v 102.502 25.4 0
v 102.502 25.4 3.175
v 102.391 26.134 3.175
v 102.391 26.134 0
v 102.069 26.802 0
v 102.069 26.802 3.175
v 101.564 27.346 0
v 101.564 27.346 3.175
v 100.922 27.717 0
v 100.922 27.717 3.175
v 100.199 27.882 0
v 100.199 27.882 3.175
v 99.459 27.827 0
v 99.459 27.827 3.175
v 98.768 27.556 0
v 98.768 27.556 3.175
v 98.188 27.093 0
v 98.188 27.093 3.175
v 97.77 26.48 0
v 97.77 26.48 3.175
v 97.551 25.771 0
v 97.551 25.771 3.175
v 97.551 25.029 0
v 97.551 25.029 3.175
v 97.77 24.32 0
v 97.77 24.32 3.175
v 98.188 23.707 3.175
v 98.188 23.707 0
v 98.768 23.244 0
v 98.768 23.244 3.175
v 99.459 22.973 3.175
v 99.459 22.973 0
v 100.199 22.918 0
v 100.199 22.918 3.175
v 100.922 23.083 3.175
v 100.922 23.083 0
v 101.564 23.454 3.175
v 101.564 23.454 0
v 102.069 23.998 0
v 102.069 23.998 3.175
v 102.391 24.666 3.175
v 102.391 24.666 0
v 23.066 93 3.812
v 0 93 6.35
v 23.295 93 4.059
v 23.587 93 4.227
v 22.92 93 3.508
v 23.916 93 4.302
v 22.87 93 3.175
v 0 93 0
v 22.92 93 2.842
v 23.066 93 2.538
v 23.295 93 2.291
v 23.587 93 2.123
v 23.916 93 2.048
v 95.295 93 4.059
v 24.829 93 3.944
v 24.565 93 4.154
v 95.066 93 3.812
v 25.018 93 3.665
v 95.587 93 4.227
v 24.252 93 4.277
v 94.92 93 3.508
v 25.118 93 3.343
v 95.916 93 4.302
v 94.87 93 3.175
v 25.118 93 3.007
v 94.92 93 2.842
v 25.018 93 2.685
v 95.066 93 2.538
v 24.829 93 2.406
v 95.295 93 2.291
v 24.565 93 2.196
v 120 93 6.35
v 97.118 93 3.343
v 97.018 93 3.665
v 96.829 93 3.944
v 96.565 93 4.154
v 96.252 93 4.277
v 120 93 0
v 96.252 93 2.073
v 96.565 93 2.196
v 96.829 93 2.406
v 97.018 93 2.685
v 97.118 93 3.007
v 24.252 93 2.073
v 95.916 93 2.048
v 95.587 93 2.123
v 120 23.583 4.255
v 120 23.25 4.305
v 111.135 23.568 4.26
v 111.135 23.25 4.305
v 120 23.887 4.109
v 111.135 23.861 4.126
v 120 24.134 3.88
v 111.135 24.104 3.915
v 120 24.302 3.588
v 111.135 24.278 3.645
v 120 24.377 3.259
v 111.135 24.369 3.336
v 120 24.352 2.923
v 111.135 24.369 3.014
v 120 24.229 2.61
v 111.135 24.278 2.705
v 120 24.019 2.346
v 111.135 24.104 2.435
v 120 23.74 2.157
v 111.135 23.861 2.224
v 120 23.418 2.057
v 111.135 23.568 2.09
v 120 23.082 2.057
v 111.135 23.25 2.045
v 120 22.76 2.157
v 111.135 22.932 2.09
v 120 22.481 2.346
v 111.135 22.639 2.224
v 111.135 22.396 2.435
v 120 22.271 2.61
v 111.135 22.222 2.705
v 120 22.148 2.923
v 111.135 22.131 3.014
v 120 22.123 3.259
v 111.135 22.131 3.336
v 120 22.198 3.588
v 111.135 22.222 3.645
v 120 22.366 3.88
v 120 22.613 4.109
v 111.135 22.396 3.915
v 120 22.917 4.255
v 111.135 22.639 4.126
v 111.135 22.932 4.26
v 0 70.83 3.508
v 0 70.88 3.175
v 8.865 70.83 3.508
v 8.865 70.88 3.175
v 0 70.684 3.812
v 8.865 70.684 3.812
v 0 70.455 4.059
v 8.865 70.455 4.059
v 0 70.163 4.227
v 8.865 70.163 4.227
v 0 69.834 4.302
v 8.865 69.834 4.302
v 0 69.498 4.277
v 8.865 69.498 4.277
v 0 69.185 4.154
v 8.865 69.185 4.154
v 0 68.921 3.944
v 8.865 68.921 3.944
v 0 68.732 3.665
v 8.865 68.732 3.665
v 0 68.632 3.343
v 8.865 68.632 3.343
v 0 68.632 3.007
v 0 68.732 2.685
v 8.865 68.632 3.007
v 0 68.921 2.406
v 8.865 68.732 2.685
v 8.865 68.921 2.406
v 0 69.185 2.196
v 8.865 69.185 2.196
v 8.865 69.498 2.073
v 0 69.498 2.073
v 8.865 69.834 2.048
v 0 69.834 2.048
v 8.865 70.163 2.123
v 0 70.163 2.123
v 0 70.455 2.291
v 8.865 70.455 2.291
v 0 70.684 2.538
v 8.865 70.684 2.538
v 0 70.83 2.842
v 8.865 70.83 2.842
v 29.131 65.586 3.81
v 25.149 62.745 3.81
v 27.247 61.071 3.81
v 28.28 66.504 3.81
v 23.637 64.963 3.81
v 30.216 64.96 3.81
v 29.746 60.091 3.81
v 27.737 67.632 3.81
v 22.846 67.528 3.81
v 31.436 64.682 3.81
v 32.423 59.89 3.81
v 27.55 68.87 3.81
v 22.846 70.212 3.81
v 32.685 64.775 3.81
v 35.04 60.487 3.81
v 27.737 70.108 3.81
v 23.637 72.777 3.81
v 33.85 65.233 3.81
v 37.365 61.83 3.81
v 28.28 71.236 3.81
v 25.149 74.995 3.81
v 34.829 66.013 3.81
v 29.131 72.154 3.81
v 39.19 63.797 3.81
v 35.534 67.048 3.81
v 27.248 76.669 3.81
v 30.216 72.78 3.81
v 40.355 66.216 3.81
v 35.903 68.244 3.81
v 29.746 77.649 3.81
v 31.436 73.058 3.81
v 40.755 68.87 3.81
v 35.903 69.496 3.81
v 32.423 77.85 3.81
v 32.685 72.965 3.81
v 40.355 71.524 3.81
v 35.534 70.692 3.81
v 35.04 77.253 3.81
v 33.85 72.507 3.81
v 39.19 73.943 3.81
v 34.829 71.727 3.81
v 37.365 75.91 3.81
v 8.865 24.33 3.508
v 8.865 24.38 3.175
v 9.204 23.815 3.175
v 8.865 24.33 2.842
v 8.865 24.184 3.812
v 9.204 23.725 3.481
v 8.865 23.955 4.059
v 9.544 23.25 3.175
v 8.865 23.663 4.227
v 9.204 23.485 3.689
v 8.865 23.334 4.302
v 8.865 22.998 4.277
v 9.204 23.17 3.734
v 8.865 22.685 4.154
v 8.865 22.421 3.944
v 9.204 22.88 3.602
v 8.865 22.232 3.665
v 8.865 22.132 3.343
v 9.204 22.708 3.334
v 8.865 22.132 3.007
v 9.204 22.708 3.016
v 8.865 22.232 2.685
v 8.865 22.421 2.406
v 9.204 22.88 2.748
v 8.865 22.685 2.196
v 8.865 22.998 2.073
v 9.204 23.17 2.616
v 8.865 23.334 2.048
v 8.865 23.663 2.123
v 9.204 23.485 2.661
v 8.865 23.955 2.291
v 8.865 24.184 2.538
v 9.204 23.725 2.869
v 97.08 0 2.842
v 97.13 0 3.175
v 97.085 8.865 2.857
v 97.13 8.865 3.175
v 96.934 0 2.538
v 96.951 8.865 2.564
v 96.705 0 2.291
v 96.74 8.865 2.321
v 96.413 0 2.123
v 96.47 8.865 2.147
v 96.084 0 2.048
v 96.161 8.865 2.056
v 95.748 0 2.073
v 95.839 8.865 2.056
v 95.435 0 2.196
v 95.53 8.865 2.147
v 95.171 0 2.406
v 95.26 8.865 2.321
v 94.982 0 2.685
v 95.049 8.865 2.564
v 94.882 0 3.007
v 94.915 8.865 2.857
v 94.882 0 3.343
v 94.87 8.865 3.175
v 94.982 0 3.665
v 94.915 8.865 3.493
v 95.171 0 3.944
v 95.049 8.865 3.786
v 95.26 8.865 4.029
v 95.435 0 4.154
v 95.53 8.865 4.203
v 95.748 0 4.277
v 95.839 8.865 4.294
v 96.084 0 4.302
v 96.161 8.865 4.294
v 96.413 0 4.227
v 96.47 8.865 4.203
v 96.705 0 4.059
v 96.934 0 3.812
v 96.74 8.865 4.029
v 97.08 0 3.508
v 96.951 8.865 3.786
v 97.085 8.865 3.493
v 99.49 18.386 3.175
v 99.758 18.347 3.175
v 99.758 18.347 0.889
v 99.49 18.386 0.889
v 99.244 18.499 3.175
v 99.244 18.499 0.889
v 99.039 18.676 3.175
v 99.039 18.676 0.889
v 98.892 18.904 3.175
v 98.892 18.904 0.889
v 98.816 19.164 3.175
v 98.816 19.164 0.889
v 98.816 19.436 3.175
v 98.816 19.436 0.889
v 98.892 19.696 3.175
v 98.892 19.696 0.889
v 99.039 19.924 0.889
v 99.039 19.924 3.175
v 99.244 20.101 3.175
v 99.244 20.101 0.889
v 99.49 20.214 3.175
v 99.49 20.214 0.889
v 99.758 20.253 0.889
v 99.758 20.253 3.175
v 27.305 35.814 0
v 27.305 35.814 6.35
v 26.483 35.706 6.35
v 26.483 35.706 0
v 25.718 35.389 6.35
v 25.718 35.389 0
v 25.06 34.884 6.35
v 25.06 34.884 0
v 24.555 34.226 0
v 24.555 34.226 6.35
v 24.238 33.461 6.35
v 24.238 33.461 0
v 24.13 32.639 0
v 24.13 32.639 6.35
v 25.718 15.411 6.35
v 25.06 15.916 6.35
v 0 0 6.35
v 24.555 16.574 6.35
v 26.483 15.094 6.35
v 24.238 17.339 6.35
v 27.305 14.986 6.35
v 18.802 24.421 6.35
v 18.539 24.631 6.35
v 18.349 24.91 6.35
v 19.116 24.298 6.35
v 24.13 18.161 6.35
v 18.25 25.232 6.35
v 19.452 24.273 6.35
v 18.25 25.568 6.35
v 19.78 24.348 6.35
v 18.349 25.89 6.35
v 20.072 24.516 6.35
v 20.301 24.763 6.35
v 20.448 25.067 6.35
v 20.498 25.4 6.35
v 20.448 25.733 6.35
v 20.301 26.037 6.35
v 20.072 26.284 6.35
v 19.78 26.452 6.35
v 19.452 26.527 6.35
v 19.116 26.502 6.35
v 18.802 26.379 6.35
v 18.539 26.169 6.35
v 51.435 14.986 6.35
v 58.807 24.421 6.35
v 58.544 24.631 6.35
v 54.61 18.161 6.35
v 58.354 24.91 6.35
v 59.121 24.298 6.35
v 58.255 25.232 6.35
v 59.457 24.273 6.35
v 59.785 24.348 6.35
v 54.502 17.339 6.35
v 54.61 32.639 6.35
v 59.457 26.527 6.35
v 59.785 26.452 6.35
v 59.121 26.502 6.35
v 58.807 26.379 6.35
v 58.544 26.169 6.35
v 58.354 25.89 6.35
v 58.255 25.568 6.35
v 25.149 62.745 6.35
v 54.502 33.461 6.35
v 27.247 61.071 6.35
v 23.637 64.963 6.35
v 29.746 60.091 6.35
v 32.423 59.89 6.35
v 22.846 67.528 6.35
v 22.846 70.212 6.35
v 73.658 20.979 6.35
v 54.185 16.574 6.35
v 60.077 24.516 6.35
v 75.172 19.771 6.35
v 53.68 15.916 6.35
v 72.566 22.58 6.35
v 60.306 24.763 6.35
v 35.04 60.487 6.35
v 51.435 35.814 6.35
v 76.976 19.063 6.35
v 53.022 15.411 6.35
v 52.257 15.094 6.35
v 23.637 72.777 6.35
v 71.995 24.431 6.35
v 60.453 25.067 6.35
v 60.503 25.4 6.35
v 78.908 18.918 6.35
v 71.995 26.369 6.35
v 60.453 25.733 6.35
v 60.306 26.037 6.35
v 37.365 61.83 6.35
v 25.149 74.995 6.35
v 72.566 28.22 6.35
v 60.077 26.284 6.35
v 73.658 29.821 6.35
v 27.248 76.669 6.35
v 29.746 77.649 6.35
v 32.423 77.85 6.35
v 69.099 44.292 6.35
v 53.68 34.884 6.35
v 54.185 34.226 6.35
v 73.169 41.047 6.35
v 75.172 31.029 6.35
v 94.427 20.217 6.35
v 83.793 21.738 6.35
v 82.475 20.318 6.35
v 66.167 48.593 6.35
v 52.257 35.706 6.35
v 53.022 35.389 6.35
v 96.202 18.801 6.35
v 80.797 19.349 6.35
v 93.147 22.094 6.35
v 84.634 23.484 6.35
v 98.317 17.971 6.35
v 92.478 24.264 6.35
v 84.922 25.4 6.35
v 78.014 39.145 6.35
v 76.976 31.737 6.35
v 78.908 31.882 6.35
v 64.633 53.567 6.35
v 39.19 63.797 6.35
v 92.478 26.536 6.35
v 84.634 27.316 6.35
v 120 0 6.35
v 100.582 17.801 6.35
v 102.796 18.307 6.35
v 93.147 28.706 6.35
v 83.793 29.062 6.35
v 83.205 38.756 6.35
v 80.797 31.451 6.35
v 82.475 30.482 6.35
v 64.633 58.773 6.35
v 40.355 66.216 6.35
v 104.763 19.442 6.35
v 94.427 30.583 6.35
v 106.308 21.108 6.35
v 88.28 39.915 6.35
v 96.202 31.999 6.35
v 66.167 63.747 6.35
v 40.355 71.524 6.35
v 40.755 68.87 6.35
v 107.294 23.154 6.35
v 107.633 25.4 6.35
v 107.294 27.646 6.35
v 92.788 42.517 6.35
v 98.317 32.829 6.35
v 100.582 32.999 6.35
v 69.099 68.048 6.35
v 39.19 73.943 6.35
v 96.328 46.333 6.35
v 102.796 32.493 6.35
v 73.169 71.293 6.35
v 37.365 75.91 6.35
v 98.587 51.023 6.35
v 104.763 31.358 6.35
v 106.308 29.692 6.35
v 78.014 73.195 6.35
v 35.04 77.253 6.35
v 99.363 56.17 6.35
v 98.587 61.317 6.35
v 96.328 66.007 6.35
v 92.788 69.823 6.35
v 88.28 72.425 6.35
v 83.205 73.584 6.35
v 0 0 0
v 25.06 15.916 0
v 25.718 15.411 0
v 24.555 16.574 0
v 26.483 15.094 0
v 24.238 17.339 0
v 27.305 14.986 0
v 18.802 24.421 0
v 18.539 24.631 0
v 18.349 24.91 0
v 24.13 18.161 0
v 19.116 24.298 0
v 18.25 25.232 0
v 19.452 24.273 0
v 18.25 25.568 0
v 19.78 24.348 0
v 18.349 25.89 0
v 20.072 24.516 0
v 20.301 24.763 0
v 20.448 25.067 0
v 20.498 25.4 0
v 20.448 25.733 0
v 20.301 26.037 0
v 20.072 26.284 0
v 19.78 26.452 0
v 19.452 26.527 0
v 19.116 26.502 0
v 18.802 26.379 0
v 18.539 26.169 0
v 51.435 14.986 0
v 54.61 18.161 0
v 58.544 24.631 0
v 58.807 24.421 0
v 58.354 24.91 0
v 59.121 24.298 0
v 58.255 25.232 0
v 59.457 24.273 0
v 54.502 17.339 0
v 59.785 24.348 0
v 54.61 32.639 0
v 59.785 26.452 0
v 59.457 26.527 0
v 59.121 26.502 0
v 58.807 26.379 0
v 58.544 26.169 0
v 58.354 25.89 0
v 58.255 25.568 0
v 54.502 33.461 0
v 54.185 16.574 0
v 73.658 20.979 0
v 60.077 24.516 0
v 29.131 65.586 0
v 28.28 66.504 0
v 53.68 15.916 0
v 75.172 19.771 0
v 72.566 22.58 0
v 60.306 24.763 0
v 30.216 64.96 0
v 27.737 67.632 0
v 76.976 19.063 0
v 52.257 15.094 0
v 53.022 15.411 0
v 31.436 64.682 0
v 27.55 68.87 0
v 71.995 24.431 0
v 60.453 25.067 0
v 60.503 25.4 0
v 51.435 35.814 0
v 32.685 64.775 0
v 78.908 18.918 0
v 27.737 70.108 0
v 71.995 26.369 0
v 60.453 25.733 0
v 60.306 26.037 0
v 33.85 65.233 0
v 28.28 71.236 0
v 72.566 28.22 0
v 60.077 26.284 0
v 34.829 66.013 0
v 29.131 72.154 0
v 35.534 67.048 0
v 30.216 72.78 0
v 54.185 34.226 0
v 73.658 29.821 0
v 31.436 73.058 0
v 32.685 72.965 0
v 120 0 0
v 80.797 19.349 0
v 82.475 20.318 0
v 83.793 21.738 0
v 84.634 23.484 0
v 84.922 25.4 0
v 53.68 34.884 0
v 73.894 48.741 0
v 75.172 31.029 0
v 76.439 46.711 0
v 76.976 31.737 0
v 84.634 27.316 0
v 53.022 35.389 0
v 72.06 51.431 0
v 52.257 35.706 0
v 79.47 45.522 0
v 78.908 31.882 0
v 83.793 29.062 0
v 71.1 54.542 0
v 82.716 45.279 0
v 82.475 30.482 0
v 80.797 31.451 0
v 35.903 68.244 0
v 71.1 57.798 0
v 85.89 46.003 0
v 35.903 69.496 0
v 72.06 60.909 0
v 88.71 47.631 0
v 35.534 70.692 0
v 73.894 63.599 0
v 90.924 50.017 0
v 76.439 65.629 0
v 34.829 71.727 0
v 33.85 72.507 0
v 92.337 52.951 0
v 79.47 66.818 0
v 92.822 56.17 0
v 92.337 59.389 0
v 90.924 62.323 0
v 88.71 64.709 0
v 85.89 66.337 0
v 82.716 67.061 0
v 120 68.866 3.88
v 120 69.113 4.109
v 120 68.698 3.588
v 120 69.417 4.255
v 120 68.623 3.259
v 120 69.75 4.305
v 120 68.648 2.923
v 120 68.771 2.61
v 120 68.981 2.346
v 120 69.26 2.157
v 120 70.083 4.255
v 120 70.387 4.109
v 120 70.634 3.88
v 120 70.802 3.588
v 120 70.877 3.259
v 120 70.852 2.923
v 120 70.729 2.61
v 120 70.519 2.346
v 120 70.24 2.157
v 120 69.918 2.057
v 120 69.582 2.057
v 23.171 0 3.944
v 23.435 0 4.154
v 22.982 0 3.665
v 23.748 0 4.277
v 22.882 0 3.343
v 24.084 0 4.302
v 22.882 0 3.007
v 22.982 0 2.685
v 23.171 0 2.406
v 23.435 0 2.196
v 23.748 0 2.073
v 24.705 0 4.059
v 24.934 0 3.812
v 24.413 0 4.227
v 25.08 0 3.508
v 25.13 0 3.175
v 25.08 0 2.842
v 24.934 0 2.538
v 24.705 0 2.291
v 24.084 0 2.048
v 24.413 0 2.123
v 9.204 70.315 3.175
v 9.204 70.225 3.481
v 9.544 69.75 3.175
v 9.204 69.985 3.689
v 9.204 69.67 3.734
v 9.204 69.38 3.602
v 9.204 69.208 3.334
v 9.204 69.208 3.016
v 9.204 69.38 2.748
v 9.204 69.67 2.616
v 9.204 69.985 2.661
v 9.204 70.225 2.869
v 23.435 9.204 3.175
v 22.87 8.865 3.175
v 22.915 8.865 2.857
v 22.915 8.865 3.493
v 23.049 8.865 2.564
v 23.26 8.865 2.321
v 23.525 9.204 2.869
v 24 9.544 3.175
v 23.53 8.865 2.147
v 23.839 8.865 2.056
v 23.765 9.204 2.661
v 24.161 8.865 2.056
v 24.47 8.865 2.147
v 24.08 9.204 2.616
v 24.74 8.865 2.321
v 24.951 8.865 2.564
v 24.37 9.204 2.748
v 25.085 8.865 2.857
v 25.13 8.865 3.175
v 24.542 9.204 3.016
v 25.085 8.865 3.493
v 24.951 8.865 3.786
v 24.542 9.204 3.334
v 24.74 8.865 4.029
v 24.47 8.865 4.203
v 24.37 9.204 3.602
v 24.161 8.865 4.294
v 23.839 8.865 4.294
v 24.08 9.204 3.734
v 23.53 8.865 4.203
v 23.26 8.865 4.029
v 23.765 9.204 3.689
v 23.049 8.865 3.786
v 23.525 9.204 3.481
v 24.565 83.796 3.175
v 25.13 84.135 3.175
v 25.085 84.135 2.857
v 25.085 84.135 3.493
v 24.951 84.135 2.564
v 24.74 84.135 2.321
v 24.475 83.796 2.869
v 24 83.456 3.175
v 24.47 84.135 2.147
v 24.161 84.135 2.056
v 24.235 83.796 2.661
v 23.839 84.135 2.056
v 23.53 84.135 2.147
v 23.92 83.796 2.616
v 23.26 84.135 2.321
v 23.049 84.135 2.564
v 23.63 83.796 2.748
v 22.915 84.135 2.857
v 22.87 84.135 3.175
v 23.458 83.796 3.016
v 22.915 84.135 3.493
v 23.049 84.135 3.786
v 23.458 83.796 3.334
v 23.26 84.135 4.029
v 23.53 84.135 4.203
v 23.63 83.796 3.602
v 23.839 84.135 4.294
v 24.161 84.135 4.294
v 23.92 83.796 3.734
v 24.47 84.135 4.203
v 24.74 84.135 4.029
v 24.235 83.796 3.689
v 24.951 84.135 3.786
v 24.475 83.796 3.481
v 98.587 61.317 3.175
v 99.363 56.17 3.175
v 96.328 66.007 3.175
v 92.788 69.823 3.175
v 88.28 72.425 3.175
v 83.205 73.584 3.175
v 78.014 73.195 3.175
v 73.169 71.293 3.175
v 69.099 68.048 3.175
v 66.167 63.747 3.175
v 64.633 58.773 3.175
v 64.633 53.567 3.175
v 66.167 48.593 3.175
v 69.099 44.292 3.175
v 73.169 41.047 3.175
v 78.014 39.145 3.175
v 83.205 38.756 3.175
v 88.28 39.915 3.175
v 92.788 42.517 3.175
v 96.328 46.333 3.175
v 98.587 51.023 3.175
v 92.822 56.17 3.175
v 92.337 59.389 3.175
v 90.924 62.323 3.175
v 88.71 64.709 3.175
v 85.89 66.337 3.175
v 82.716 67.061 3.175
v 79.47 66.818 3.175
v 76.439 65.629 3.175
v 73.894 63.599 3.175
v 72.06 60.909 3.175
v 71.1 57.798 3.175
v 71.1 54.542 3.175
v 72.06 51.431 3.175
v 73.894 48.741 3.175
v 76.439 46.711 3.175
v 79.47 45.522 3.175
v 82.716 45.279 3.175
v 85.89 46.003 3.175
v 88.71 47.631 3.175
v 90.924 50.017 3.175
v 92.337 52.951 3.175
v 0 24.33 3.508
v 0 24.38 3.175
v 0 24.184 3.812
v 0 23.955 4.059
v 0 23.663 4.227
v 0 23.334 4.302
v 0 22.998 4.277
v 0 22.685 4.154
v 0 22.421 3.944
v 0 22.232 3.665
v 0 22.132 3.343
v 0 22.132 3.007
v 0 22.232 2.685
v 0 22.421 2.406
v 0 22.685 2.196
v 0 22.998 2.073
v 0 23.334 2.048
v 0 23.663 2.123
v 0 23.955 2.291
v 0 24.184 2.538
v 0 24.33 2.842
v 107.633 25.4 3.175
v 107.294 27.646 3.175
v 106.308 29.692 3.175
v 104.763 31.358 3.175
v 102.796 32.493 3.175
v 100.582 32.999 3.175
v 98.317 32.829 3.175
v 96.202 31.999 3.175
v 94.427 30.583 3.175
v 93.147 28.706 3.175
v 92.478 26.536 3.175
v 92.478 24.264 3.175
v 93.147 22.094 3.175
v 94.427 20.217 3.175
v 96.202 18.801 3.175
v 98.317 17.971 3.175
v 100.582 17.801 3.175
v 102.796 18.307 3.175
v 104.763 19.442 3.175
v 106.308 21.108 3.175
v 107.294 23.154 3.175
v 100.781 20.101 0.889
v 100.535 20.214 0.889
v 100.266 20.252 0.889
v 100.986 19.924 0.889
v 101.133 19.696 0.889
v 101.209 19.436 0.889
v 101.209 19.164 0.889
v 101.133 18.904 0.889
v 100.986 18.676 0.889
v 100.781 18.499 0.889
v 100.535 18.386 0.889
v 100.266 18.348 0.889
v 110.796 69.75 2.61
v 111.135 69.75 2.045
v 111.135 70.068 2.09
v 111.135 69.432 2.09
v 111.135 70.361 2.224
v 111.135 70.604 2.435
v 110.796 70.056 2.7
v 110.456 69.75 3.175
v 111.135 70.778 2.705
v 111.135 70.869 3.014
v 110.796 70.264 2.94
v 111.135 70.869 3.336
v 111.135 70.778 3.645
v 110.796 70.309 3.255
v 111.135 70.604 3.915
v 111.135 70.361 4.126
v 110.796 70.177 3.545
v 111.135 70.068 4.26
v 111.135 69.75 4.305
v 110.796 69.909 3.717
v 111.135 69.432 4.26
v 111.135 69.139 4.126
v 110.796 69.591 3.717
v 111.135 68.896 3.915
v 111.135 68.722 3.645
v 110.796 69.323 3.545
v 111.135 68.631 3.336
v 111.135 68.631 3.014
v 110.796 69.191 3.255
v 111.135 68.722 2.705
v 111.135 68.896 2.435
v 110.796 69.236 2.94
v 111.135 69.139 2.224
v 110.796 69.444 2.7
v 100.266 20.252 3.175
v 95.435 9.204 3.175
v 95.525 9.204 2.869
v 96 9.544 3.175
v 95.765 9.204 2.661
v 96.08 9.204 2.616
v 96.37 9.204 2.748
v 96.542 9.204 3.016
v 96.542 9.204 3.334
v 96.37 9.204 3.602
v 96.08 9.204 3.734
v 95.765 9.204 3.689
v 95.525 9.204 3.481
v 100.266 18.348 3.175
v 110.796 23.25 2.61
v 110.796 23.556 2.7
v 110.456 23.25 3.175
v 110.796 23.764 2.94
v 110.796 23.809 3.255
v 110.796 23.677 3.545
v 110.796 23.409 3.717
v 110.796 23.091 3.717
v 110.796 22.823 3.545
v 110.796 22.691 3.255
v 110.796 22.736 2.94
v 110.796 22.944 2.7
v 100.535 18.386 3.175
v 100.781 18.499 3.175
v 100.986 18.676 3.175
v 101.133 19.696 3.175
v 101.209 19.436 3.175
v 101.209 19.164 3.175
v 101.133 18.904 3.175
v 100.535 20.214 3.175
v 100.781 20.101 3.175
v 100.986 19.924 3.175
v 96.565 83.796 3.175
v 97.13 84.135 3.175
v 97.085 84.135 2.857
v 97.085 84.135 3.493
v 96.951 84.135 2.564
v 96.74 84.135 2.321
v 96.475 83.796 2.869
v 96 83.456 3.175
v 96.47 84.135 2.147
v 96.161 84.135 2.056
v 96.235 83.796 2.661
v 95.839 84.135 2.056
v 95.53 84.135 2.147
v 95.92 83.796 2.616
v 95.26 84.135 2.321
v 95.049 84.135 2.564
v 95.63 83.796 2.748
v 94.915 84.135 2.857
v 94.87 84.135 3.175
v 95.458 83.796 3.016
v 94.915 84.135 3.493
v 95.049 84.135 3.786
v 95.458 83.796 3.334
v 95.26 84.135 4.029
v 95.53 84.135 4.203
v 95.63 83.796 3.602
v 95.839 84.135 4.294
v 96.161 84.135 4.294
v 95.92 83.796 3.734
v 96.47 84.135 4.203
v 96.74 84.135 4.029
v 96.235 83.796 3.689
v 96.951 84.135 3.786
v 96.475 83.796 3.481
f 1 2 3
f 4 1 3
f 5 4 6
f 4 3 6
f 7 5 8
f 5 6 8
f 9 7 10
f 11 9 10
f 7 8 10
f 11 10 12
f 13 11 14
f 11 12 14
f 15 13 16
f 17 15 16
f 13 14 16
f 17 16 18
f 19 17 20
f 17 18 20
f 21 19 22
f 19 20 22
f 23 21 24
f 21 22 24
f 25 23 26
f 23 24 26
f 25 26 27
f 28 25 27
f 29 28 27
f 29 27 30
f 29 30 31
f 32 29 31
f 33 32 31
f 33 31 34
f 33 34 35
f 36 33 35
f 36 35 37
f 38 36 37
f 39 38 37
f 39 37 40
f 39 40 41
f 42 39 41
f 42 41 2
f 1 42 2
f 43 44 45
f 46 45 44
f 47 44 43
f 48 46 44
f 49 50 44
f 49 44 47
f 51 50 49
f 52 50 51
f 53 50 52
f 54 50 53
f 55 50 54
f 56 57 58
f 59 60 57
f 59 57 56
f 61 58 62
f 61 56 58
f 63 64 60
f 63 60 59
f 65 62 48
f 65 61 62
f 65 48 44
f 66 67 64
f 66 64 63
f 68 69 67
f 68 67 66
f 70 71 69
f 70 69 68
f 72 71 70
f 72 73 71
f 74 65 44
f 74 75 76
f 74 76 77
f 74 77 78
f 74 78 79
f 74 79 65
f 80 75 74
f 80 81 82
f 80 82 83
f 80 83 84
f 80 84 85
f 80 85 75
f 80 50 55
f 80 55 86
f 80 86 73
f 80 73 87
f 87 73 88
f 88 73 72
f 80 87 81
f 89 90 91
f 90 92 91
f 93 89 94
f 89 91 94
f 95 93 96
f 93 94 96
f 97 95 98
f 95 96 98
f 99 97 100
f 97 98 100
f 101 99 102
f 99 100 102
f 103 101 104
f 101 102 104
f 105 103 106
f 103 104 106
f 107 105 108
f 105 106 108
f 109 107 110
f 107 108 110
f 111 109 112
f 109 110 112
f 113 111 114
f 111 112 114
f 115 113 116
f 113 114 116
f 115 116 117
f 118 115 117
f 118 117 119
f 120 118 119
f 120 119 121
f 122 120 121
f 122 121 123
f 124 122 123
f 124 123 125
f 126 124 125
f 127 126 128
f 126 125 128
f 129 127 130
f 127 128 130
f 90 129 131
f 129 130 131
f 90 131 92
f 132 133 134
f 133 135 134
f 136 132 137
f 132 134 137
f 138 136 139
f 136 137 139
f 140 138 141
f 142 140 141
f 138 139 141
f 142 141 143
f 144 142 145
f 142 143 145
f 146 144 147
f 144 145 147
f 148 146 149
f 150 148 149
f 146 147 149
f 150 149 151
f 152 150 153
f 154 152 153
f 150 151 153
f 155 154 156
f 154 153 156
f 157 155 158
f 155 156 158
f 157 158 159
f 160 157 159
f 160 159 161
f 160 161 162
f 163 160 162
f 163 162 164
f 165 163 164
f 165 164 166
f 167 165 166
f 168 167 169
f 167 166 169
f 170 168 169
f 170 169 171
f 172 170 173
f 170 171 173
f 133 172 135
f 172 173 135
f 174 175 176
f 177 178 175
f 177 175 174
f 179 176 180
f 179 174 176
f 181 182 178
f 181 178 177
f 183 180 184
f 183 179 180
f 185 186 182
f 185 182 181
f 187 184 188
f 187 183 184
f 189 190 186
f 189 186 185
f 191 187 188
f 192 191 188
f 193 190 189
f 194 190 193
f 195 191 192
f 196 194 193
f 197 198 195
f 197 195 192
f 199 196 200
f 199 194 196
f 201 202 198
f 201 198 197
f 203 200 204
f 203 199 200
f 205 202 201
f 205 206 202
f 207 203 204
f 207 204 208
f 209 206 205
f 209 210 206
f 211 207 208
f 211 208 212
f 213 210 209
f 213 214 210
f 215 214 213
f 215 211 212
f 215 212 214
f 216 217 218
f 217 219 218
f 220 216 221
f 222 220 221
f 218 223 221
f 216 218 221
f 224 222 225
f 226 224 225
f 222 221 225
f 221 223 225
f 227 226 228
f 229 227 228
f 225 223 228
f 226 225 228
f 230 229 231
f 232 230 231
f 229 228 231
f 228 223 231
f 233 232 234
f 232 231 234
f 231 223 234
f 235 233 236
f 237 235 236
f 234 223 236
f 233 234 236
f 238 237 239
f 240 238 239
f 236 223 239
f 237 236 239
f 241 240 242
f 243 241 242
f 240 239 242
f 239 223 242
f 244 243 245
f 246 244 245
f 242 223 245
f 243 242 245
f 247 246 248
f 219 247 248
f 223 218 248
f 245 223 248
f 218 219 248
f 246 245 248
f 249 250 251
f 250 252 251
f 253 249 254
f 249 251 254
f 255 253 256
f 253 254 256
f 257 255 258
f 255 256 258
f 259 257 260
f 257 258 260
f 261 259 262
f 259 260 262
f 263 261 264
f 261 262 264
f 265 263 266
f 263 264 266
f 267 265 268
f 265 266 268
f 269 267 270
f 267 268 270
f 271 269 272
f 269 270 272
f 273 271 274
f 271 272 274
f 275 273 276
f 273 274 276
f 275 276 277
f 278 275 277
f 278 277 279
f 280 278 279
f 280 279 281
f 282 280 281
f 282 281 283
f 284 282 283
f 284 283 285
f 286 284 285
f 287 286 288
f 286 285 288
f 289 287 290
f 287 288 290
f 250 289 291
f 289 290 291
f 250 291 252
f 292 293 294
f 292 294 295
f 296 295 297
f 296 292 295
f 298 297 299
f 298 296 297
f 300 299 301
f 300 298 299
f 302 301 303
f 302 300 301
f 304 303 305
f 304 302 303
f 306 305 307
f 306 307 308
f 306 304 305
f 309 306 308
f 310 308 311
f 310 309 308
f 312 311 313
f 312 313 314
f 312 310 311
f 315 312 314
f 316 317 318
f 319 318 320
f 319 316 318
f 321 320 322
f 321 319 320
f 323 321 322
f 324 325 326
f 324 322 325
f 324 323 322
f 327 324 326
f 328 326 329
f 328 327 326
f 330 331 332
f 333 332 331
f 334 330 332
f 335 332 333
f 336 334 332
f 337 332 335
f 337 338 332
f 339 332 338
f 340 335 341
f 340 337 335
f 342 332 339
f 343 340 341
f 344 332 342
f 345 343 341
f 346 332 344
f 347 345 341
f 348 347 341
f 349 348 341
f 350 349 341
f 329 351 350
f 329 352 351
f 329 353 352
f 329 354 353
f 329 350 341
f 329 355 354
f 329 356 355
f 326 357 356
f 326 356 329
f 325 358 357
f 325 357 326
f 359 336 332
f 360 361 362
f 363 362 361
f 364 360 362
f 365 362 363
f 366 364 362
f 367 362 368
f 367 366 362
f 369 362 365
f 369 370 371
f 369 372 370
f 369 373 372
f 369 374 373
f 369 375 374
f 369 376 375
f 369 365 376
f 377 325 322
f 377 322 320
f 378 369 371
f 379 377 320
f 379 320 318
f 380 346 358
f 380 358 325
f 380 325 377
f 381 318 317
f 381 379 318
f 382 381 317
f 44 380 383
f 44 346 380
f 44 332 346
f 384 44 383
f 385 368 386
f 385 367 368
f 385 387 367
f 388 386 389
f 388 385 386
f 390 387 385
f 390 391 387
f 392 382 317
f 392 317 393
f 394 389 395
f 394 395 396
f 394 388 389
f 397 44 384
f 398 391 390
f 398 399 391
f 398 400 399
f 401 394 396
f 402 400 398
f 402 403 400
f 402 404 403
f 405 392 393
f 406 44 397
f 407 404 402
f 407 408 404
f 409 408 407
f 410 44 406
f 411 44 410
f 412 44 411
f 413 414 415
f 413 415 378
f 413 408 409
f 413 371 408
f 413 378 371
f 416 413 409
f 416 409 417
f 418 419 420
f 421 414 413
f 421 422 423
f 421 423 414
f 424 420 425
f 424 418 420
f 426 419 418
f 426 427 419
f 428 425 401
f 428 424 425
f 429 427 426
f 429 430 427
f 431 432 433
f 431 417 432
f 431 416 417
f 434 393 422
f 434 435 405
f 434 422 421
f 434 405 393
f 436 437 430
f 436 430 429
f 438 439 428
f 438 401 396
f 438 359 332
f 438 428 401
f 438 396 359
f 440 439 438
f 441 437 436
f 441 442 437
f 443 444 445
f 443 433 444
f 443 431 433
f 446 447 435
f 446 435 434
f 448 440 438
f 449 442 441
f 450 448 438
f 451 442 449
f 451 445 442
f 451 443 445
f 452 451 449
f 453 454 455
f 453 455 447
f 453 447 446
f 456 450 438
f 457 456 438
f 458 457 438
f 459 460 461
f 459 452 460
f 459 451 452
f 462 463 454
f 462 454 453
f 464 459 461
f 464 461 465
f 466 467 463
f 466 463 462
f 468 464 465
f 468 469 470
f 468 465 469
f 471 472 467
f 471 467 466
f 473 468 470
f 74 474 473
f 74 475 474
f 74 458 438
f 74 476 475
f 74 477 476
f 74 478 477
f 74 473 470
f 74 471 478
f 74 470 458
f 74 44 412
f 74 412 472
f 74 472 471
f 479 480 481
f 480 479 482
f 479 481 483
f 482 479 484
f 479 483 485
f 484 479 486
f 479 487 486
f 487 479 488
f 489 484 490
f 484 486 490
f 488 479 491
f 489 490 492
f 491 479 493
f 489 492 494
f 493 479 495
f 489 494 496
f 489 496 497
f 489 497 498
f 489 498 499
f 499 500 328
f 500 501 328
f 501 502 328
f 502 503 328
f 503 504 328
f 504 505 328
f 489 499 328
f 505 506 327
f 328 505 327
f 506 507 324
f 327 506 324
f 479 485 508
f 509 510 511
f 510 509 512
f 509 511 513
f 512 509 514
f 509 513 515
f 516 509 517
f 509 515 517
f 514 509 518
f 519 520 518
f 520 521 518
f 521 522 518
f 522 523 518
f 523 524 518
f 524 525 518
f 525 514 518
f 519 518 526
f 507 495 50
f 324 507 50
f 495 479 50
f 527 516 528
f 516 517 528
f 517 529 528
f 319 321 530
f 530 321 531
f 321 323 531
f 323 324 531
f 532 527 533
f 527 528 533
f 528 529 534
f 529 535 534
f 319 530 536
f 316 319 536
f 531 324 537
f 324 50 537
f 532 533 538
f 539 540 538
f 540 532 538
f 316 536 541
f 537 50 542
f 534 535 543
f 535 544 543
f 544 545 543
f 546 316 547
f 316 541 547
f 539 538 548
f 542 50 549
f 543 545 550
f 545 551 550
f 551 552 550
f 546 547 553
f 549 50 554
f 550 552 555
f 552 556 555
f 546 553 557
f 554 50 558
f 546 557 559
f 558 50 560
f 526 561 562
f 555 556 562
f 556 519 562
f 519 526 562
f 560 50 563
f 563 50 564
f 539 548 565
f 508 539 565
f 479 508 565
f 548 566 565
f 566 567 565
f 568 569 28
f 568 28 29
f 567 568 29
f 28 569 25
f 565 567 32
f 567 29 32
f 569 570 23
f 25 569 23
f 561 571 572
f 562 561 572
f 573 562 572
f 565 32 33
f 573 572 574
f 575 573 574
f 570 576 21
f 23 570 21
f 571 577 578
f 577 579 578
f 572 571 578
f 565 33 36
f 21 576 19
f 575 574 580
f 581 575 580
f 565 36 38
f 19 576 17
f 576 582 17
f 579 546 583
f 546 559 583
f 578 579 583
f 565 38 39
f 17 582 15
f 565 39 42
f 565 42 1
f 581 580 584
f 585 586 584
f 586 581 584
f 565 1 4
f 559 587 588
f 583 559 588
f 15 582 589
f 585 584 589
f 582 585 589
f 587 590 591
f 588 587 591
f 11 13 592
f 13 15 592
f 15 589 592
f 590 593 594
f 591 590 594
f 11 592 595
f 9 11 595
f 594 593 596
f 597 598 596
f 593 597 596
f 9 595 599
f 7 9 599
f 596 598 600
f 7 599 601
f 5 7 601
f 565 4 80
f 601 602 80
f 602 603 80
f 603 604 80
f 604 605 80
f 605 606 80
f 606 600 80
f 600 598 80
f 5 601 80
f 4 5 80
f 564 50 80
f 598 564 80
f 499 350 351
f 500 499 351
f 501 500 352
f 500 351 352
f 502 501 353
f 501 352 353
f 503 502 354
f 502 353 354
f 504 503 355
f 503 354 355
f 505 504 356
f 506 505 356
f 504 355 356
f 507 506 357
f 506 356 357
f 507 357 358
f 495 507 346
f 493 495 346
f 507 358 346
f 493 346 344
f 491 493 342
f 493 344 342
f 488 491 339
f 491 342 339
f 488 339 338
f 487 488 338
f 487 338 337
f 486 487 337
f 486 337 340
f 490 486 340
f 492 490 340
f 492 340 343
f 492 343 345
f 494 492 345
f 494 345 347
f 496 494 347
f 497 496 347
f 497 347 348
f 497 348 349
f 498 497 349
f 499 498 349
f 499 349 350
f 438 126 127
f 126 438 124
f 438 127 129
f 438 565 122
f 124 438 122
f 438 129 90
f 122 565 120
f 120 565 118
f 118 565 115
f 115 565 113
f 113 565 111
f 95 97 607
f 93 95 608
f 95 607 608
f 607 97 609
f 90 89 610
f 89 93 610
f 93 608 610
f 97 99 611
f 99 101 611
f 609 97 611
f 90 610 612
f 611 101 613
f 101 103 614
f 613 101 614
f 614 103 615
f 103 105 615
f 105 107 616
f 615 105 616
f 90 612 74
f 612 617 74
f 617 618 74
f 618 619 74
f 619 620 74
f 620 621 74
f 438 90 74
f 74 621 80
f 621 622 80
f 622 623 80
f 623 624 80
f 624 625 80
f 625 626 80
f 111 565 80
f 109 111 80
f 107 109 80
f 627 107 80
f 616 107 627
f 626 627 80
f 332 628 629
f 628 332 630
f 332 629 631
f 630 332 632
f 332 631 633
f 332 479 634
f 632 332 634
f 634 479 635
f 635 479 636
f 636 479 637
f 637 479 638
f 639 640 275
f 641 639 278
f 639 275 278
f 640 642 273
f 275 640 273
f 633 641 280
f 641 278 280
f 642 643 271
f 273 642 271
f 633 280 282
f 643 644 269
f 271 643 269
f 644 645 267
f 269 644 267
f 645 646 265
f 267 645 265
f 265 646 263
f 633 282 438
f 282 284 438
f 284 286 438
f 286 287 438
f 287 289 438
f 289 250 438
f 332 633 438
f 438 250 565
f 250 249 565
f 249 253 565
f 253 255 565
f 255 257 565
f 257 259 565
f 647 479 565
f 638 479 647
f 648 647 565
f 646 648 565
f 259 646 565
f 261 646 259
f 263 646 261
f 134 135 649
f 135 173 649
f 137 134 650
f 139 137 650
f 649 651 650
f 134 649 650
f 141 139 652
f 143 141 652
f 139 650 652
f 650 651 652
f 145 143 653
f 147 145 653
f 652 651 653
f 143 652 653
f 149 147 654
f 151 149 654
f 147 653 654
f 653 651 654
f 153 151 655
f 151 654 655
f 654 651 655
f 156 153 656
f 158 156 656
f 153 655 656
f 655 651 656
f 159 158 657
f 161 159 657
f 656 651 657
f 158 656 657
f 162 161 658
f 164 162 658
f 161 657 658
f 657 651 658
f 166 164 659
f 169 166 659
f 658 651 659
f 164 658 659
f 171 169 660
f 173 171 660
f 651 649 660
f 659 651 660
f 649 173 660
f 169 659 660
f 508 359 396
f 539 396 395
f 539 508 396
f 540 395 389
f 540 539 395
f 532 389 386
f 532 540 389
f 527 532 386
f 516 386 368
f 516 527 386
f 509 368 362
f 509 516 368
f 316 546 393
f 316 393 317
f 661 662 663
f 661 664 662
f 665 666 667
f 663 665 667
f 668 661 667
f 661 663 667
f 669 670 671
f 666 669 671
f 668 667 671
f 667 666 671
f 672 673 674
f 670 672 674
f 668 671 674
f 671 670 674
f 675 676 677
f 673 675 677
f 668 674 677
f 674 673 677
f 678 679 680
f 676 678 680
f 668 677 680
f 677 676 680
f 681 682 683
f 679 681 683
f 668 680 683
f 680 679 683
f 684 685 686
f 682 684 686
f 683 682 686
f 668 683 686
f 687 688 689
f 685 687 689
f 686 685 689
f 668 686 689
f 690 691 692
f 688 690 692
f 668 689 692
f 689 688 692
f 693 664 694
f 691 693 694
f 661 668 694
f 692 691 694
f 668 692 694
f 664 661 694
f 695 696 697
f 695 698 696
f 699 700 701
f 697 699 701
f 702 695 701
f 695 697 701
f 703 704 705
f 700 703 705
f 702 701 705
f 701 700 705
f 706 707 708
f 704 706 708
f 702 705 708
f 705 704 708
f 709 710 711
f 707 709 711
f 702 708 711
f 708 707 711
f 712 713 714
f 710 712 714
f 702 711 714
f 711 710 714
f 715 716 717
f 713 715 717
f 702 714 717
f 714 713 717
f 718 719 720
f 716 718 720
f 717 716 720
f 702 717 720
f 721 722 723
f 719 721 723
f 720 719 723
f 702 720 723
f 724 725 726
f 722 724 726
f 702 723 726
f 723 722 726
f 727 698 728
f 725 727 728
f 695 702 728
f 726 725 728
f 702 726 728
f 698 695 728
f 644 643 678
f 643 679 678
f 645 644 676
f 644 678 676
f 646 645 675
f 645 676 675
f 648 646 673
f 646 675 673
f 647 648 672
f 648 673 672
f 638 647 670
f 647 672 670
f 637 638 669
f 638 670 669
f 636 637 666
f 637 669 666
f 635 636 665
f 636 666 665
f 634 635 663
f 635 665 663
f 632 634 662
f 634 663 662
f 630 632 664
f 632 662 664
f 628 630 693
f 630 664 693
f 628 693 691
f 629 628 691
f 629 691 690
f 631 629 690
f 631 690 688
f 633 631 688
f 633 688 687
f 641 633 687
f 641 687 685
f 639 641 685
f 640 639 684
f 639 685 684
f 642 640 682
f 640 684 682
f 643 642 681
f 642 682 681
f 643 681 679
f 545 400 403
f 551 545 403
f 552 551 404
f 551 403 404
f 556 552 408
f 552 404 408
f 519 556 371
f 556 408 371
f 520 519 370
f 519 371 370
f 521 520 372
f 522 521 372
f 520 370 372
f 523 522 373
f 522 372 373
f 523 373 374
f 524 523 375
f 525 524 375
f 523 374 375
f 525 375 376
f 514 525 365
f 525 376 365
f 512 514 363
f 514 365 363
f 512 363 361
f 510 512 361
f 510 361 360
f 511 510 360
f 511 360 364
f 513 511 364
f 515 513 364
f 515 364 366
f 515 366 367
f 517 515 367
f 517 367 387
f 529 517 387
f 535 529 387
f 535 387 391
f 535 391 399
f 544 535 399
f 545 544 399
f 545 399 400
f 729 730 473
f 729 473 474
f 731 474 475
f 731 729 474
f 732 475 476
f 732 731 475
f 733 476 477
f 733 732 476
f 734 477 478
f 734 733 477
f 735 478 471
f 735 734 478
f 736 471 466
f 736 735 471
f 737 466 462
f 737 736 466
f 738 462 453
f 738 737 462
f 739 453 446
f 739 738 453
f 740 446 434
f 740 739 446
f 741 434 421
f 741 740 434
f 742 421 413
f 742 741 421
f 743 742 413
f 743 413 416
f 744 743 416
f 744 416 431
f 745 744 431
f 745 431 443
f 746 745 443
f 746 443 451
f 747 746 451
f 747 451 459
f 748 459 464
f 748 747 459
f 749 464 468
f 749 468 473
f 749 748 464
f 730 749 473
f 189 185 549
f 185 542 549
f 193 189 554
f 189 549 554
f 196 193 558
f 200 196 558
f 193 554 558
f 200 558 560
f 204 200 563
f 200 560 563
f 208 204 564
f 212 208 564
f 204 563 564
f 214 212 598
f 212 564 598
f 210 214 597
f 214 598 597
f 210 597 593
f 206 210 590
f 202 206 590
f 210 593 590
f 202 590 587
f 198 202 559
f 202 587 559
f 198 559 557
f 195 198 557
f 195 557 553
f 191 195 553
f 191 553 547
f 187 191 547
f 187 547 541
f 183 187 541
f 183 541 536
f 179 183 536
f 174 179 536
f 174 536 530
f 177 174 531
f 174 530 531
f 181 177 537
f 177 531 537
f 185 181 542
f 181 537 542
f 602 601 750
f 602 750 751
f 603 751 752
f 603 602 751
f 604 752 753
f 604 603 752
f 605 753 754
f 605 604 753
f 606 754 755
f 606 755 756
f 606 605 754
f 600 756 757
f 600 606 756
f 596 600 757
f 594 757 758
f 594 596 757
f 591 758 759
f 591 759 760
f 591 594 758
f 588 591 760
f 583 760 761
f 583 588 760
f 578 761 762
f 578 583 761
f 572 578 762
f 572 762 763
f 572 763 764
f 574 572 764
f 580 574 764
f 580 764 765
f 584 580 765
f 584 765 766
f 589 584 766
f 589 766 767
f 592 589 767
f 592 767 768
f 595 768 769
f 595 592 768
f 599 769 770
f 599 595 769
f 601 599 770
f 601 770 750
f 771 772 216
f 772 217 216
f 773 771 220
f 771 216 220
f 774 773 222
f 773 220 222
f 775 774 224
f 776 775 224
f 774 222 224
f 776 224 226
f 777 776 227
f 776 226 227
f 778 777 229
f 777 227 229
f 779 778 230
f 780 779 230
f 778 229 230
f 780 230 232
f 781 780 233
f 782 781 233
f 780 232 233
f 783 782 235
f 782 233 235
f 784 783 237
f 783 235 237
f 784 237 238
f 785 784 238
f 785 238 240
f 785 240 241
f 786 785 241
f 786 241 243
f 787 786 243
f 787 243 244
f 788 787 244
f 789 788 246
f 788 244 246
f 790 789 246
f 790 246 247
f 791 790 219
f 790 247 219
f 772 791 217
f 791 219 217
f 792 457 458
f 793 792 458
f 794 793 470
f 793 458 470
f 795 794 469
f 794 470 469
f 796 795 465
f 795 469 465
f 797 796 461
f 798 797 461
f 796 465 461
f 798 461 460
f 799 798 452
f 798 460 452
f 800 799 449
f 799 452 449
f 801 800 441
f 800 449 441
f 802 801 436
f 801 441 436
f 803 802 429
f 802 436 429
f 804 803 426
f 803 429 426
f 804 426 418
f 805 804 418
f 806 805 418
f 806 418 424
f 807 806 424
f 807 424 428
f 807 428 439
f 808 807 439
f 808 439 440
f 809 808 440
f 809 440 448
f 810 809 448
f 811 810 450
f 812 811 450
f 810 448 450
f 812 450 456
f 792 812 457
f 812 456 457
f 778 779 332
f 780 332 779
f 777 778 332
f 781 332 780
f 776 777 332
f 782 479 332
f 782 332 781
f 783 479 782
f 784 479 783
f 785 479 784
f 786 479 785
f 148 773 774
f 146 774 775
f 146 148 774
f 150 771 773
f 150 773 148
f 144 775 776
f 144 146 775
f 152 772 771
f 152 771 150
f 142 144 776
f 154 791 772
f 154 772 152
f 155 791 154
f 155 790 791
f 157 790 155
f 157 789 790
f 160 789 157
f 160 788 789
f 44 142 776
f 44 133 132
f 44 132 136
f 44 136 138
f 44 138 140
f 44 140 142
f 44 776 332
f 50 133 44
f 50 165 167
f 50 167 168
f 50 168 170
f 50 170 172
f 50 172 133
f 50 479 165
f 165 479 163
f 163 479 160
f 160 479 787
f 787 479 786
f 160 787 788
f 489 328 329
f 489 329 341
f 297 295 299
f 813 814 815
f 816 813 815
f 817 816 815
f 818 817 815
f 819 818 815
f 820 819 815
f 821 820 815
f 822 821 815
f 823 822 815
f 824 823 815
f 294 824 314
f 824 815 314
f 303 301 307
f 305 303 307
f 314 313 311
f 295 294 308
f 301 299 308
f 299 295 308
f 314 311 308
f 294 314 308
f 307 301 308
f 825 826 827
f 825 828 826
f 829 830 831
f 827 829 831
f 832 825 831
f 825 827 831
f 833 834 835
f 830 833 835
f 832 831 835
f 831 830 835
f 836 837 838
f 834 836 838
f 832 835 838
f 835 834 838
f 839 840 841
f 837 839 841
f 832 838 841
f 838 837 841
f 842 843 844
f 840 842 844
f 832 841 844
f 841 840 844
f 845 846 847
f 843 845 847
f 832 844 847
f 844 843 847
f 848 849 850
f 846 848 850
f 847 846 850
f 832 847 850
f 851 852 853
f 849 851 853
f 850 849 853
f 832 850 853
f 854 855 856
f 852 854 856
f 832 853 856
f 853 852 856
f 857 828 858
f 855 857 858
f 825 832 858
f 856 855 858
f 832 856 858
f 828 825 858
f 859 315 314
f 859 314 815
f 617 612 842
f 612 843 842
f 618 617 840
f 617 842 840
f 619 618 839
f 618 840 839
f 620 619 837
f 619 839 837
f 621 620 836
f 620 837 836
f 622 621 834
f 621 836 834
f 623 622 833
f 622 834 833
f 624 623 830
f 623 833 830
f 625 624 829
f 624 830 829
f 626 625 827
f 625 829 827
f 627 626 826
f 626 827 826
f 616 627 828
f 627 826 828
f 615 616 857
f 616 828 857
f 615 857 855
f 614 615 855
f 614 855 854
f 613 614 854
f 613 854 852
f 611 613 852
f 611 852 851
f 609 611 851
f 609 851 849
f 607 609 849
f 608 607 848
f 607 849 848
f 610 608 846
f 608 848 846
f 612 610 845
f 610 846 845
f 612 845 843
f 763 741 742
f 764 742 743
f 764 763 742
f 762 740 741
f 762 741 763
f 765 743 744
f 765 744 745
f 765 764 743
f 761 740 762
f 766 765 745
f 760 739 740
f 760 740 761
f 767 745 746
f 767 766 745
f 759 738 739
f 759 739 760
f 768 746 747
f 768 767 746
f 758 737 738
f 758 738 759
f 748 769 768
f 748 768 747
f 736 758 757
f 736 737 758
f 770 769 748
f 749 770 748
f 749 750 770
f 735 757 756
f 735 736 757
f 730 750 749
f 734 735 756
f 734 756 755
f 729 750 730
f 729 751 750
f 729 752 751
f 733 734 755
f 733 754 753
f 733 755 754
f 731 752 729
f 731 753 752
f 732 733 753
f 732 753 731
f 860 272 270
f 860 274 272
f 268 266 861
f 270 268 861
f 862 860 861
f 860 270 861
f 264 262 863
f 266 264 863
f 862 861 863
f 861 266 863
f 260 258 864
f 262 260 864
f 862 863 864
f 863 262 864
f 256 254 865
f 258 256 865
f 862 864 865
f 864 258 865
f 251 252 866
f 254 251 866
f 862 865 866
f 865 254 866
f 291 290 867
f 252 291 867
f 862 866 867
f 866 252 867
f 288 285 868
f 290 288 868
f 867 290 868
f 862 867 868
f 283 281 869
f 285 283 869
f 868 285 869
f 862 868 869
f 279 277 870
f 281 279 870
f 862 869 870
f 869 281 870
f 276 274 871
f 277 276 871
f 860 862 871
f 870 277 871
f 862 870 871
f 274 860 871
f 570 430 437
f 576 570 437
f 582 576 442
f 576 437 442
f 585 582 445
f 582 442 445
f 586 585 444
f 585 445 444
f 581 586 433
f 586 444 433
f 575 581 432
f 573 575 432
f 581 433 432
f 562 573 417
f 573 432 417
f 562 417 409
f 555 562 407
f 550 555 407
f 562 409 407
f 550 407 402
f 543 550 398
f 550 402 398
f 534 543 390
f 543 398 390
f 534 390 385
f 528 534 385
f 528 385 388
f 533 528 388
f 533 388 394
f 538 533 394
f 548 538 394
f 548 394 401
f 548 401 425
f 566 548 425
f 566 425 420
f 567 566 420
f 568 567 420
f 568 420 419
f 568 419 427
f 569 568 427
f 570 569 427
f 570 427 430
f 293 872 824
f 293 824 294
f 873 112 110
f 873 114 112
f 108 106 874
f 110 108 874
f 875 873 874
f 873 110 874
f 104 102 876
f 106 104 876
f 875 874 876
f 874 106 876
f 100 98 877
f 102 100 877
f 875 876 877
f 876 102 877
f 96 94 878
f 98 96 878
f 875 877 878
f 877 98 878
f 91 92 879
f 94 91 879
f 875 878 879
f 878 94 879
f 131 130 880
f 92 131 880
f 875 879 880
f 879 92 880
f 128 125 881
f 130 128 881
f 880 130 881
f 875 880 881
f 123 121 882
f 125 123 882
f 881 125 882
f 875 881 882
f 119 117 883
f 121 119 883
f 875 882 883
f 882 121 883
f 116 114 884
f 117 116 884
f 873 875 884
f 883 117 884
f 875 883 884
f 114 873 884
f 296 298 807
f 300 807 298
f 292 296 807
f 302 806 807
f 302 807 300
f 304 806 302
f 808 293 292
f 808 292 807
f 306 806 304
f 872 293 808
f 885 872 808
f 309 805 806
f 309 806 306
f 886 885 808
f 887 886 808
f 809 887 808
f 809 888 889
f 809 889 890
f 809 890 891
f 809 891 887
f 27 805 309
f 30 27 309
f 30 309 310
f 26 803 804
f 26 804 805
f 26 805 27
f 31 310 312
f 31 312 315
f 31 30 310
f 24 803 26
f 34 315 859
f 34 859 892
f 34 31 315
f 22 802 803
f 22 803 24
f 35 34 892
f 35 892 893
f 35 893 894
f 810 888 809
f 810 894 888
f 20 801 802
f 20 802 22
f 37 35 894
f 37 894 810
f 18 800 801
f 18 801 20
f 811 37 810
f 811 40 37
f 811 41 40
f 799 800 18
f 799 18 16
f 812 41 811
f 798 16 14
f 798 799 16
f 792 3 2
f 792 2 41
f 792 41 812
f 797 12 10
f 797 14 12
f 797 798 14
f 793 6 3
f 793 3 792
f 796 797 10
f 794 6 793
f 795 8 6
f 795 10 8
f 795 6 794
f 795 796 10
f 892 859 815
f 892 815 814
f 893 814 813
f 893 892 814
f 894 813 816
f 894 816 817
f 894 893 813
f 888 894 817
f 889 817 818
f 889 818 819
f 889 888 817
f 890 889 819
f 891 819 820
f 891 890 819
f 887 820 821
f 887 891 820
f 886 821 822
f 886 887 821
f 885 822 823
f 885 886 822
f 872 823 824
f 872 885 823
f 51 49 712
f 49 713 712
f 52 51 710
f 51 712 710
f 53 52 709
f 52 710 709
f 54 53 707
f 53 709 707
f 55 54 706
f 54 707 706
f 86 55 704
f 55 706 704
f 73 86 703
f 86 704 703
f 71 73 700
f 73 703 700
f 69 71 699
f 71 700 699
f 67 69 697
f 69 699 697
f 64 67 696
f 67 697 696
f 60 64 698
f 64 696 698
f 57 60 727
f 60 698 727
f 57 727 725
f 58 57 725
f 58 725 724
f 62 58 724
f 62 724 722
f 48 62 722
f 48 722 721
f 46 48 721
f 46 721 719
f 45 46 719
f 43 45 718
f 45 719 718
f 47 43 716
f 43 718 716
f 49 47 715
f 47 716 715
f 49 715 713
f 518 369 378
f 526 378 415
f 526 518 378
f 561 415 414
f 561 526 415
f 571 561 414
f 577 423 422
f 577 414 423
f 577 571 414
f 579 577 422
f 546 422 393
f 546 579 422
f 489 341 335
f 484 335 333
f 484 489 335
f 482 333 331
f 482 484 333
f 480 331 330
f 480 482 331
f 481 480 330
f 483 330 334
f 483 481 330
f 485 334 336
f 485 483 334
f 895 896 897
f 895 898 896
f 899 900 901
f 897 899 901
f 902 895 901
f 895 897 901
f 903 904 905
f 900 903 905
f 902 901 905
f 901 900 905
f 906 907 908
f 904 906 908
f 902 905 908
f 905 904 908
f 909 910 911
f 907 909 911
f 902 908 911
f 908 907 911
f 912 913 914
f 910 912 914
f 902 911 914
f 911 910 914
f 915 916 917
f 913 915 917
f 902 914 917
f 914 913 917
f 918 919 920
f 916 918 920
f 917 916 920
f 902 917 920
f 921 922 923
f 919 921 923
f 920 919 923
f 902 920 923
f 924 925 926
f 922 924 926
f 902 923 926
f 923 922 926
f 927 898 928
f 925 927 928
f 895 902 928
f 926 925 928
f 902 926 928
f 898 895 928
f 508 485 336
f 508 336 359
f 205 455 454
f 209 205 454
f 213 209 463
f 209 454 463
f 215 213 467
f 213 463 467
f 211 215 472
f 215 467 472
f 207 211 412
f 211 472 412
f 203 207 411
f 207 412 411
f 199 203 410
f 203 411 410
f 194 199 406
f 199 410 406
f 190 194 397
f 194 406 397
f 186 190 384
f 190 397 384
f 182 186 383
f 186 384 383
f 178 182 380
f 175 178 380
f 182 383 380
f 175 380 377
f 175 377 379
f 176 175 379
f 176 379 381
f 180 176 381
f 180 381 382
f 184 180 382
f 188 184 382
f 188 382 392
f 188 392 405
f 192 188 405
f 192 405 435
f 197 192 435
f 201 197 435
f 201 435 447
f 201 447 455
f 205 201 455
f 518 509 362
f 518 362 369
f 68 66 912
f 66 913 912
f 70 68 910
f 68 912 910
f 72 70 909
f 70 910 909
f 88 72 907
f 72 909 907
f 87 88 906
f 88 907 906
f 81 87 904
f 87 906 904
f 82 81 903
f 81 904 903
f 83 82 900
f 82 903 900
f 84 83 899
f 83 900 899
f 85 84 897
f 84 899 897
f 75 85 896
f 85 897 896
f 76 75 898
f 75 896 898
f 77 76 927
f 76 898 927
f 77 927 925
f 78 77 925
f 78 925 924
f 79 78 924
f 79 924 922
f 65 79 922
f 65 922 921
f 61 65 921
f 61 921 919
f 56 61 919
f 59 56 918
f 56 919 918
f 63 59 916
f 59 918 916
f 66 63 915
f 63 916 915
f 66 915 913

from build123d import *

# Parameters (mm, degrees)
SKETCH1_W                               = 120.00000003
SKETCH1_H                               = 92.999999928
BOSS_EXTRUDE1_DEPTH                     = 6.35
AC_INLET_DEPTH                          = 152.951711059
AC_INLET_SCREWS_D                       = 2.2606
FUSEHOLDER_D                            = 13
POWER_SWITCH_R                          = 7.62
POWER_SWITCH_INLAY_DEPTH                = 3.175
POWER_SWITCH_3_R                        = 2.4892
POWER_SWITCH_HOLE_DEPTH                 = 152.951711059
POWER_START                             = -3.175
POWER_SWITCH_LOCK_TAB_DEPTH             = 2.286
LED_PANEL_MOUNT_D                       = 8.0264
ADVANCEDHOLE1_START                     = 3.175
ADVANCEDHOLE1_OUTLINE_R                 = 17.4625
ADVANCEDHOLE1_DEPTH                     = 3.175
ADVANCEDHOLE1_2_OUTLINE_R               = 10.922
ADVANCEDHOLE1_2_DEPTH                   = 3.175
CBORE_FOR_M8_HEX_HEAD_BOLT2_D           = 8.4
CBORE_FOR_M8_HEX_HEAD_BOLT2_CBORE_D     = 18.01
CBORE_FOR_M8_HEX_HEAD_BOLT2_CBORE_DEPTH = 2.54
F_4_40_TAPPED_HOLE1_D                   = 2.2606
F_4_40_TAPPED_HOLE1_DEPTH               = 8.8646
F_4_40_TAPPED_HOLE1_TIP                 = 0.679152758
F_4_40_TAPPED_HOLE2_D                   = 2.2606
F_4_40_TAPPED_HOLE2_DEPTH               = 8.8646
F_4_40_TAPPED_HOLE2_TIP                 = 0.679152758
F_4_40_TAPPED_HOLE4_D                   = 2.2606
F_4_40_TAPPED_HOLE4_DEPTH               = 8.8646
F_4_40_TAPPED_HOLE4_TIP                 = 0.679152758


# Read off the part's stored shape, not the designer's step: AdvancedHole1, #4-40 Tapped Hole3
with BuildPart() as part:
    # Sketch1 → Boss-Extrude1 (new body)
    with BuildSketch(Plane.XY):
        with Locations((60.000000015, 46.499999964)):
            Rectangle(SKETCH1_W, SKETCH1_H)
    extrude(amount=BOSS_EXTRUDE1_DEPTH)

    # Sketch6 → AC Inlet (cut, through all)
    with BuildSketch(Plane(origin=(0, 0, 0), x_dir=(-1, 0, 0), z_dir=(0, 0, -1))):
        with BuildLine():
            Line((-51.435, 35.814), (-27.305, 35.814))
            ThreePointArc((-27.305, 35.814), (-25.05993597, 34.88406403), (-24.13, 32.639))
            Line((-24.13, 32.639), (-24.13, 18.161))
            ThreePointArc((-24.13, 18.161), (-25.05993597, 15.91593597), (-27.305, 14.986))
            Line((-27.305, 14.986), (-51.435, 14.986))
            ThreePointArc((-51.435, 14.986), (-53.68006403, 15.91593597), (-54.61, 18.161))
            Line((-54.61, 18.161), (-54.61, 32.639))
            ThreePointArc((-54.61, 32.639), (-53.68006403, 34.88406403), (-51.435, 35.814))
        make_face()
    extrude(amount=-AC_INLET_DEPTH, mode=Mode.SUBTRACT)

    # AC Inlet Screws (through all)
    with Locations(Plane(origin=(0, 0, 0), x_dir=(-1, 0, 0), z_dir=(0, 0, -1))):
        with Locations((-59.3725, 25.4), (-19.3675, 25.4)):
            Hole(AC_INLET_SCREWS_D / 2)

    # Fuseholder (through all)
    with Locations(Plane(origin=(0, 0, 0), x_dir=(-1, 0, 0), z_dir=(0, 0, -1))):
        with Locations((-78.4225, 25.4)):
            Hole(FUSEHOLDER_D / 2)

    # Power Switch → Power Switch Inlay (cut)
    with BuildSketch(Plane.XY.offset(6.35)):
        with Locations((100.0125, 25.4)):
            Circle(POWER_SWITCH_R)
    extrude(amount=-POWER_SWITCH_INLAY_DEPTH, mode=Mode.SUBTRACT)

    # Power Switch<3> → Power Switch Hole (cut, through all)
    with BuildSketch(Plane.XY.offset(6.35)):
        with Locations((100.0125, 25.4)):
            Circle(POWER_SWITCH_3_R)
    extrude(amount=-POWER_SWITCH_HOLE_DEPTH, mode=Mode.SUBTRACT)

    # Power Switch<4> → Power Switch Lock Tab (cut)
    with BuildSketch(Plane.XY.offset(6.35).offset(POWER_START)):
        with BuildLine():
            Line((99.7585, 20.2525), (100.2665, 20.2525))
            ThreePointArc((100.2665, 20.2525), (101.219, 19.3), (100.2665, 18.3475))
            Line((100.2665, 18.3475), (99.7585, 18.3475))
            ThreePointArc((99.7585, 18.3475), (98.806, 19.3), (99.7585, 20.2525))
        make_face()
    extrude(amount=-POWER_SWITCH_LOCK_TAB_DEPTH, mode=Mode.SUBTRACT)

    # LED Panel Mount (through all)
    with Locations(Plane(origin=(0, 0, 0), x_dir=(-1, 0, 0), z_dir=(0, 0, -1))):
        with Locations((-31.75, 68.869999928)):
            Hole(LED_PANEL_MOUNT_D / 2)

    # AdvancedHole1 outline → AdvancedHole1 (cut)
    with BuildSketch(Plane.XY.offset(ADVANCEDHOLE1_START)):
        with Locations((81.90000003, 56.169999928)):
            Circle(ADVANCEDHOLE1_OUTLINE_R)
    extrude(amount=ADVANCEDHOLE1_DEPTH, mode=Mode.SUBTRACT)

    # AdvancedHole1 2 outline → AdvancedHole1 2 (cut)
    with BuildSketch(Plane.XY):
        with Locations((81.90000003, 56.169999928)):
            Circle(ADVANCEDHOLE1_2_OUTLINE_R)
    extrude(amount=ADVANCEDHOLE1_2_DEPTH, mode=Mode.SUBTRACT)

    # CBORE for M8 Hex Head Bolt2 (through all)
    with Locations(Plane.XY.offset(6.35)):
        with Locations((31.75, 68.869999928)):
            CounterBoreHole(CBORE_FOR_M8_HEX_HEAD_BOLT2_D / 2, CBORE_FOR_M8_HEX_HEAD_BOLT2_CBORE_D / 2, CBORE_FOR_M8_HEX_HEAD_BOLT2_CBORE_DEPTH)

    # #4-40 Tapped Hole1
    with Locations(Plane(origin=(0, 0, 0), x_dir=(-1, 0, 0), z_dir=(0, -1, 0))):
        with Locations((-24.000000006, -3.175), (-96.000000024, -3.175)):
            Hole(F_4_40_TAPPED_HOLE1_D / 2, depth=F_4_40_TAPPED_HOLE1_DEPTH)
            with Locations((0, 0, -(F_4_40_TAPPED_HOLE1_DEPTH + F_4_40_TAPPED_HOLE1_TIP / 2))):  # 118° drill point
                Cone(0, F_4_40_TAPPED_HOLE1_D / 2, F_4_40_TAPPED_HOLE1_TIP, mode=Mode.SUBTRACT)

    # #4-40 Tapped Hole2
    with Locations(Plane(origin=(0, 92.999999928, 0), x_dir=(1, 0, 0), z_dir=(0, 1, 0))):
        with Locations((24.000000006, -3.175), (96.000000024, -3.175)):
            Hole(F_4_40_TAPPED_HOLE2_D / 2, depth=F_4_40_TAPPED_HOLE2_DEPTH)
            with Locations((0, 0, -(F_4_40_TAPPED_HOLE2_DEPTH + F_4_40_TAPPED_HOLE2_TIP / 2))):  # 118° drill point
                Cone(0, F_4_40_TAPPED_HOLE2_D / 2, F_4_40_TAPPED_HOLE2_TIP, mode=Mode.SUBTRACT)

    # #4-40 Tapped Hole3 outline → #4-40 Tapped Hole3 (revolve, cut)
    with BuildSketch(Plane(origin=(0, 23.249999982, 3.175), x_dir=(0, 1, 0), z_dir=(0, 0, -1))):
        Polygon((1.1303, 8.8646), (0, 9.543752758), (0, 0), (1.1303, 0), align=None)
    revolve(axis=Axis((0, 23.249999982, 3.175), (1, 0, 0)), mode=Mode.SUBTRACT)

    # 4-40 Tapped Hole3 2 outline → 4-40 Tapped Hole3 2 (revolve, cut)
    with BuildSketch(Plane(origin=(0, 69.749999946, 3.175), x_dir=(0, 1, 0), z_dir=(0, 0, -1))):
        Polygon((1.1303, 8.8646), (0, 9.543752758), (0, 0), (1.1303, 0), align=None)
    revolve(axis=Axis((0, 69.749999946, 3.175), (1, 0, 0)), mode=Mode.SUBTRACT)

    # #4-40 Tapped Hole4
    with Locations(Plane(origin=(120.00000003, 0, 0), x_dir=(0, 0, -1), z_dir=(1, 0, 0))):
        with Locations((-3.175, 69.749999946), (-3.175, 23.249999982)):
            Hole(F_4_40_TAPPED_HOLE4_D / 2, depth=F_4_40_TAPPED_HOLE4_DEPTH)
            with Locations((0, 0, -(F_4_40_TAPPED_HOLE4_DEPTH + F_4_40_TAPPED_HOLE4_TIP / 2))):  # 118° drill point
                Cone(0, F_4_40_TAPPED_HOLE4_D / 2, F_4_40_TAPPED_HOLE4_TIP, mode=Mode.SUBTRACT)


solid = part.part
